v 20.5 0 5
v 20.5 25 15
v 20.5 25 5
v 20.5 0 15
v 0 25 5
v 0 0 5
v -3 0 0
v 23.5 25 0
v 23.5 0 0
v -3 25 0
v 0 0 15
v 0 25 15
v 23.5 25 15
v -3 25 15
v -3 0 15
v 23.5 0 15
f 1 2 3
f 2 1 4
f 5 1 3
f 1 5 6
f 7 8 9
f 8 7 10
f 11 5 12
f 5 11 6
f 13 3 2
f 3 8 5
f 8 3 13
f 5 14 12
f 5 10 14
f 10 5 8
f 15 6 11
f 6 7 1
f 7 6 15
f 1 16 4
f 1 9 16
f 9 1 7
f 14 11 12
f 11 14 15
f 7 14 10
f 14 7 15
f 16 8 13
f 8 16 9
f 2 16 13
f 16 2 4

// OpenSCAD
// Real Lonely T-Rex Game: Jump Motor Base
// Copyright (C) 2017, Uri Shaked and Ariella Eliassaf

$fn=120;

cube([20.5,25,5]);

translate([-3,0,0])
cube([3,25,15]);

translate([20.5,0,0])
cube([3,25,15]);
